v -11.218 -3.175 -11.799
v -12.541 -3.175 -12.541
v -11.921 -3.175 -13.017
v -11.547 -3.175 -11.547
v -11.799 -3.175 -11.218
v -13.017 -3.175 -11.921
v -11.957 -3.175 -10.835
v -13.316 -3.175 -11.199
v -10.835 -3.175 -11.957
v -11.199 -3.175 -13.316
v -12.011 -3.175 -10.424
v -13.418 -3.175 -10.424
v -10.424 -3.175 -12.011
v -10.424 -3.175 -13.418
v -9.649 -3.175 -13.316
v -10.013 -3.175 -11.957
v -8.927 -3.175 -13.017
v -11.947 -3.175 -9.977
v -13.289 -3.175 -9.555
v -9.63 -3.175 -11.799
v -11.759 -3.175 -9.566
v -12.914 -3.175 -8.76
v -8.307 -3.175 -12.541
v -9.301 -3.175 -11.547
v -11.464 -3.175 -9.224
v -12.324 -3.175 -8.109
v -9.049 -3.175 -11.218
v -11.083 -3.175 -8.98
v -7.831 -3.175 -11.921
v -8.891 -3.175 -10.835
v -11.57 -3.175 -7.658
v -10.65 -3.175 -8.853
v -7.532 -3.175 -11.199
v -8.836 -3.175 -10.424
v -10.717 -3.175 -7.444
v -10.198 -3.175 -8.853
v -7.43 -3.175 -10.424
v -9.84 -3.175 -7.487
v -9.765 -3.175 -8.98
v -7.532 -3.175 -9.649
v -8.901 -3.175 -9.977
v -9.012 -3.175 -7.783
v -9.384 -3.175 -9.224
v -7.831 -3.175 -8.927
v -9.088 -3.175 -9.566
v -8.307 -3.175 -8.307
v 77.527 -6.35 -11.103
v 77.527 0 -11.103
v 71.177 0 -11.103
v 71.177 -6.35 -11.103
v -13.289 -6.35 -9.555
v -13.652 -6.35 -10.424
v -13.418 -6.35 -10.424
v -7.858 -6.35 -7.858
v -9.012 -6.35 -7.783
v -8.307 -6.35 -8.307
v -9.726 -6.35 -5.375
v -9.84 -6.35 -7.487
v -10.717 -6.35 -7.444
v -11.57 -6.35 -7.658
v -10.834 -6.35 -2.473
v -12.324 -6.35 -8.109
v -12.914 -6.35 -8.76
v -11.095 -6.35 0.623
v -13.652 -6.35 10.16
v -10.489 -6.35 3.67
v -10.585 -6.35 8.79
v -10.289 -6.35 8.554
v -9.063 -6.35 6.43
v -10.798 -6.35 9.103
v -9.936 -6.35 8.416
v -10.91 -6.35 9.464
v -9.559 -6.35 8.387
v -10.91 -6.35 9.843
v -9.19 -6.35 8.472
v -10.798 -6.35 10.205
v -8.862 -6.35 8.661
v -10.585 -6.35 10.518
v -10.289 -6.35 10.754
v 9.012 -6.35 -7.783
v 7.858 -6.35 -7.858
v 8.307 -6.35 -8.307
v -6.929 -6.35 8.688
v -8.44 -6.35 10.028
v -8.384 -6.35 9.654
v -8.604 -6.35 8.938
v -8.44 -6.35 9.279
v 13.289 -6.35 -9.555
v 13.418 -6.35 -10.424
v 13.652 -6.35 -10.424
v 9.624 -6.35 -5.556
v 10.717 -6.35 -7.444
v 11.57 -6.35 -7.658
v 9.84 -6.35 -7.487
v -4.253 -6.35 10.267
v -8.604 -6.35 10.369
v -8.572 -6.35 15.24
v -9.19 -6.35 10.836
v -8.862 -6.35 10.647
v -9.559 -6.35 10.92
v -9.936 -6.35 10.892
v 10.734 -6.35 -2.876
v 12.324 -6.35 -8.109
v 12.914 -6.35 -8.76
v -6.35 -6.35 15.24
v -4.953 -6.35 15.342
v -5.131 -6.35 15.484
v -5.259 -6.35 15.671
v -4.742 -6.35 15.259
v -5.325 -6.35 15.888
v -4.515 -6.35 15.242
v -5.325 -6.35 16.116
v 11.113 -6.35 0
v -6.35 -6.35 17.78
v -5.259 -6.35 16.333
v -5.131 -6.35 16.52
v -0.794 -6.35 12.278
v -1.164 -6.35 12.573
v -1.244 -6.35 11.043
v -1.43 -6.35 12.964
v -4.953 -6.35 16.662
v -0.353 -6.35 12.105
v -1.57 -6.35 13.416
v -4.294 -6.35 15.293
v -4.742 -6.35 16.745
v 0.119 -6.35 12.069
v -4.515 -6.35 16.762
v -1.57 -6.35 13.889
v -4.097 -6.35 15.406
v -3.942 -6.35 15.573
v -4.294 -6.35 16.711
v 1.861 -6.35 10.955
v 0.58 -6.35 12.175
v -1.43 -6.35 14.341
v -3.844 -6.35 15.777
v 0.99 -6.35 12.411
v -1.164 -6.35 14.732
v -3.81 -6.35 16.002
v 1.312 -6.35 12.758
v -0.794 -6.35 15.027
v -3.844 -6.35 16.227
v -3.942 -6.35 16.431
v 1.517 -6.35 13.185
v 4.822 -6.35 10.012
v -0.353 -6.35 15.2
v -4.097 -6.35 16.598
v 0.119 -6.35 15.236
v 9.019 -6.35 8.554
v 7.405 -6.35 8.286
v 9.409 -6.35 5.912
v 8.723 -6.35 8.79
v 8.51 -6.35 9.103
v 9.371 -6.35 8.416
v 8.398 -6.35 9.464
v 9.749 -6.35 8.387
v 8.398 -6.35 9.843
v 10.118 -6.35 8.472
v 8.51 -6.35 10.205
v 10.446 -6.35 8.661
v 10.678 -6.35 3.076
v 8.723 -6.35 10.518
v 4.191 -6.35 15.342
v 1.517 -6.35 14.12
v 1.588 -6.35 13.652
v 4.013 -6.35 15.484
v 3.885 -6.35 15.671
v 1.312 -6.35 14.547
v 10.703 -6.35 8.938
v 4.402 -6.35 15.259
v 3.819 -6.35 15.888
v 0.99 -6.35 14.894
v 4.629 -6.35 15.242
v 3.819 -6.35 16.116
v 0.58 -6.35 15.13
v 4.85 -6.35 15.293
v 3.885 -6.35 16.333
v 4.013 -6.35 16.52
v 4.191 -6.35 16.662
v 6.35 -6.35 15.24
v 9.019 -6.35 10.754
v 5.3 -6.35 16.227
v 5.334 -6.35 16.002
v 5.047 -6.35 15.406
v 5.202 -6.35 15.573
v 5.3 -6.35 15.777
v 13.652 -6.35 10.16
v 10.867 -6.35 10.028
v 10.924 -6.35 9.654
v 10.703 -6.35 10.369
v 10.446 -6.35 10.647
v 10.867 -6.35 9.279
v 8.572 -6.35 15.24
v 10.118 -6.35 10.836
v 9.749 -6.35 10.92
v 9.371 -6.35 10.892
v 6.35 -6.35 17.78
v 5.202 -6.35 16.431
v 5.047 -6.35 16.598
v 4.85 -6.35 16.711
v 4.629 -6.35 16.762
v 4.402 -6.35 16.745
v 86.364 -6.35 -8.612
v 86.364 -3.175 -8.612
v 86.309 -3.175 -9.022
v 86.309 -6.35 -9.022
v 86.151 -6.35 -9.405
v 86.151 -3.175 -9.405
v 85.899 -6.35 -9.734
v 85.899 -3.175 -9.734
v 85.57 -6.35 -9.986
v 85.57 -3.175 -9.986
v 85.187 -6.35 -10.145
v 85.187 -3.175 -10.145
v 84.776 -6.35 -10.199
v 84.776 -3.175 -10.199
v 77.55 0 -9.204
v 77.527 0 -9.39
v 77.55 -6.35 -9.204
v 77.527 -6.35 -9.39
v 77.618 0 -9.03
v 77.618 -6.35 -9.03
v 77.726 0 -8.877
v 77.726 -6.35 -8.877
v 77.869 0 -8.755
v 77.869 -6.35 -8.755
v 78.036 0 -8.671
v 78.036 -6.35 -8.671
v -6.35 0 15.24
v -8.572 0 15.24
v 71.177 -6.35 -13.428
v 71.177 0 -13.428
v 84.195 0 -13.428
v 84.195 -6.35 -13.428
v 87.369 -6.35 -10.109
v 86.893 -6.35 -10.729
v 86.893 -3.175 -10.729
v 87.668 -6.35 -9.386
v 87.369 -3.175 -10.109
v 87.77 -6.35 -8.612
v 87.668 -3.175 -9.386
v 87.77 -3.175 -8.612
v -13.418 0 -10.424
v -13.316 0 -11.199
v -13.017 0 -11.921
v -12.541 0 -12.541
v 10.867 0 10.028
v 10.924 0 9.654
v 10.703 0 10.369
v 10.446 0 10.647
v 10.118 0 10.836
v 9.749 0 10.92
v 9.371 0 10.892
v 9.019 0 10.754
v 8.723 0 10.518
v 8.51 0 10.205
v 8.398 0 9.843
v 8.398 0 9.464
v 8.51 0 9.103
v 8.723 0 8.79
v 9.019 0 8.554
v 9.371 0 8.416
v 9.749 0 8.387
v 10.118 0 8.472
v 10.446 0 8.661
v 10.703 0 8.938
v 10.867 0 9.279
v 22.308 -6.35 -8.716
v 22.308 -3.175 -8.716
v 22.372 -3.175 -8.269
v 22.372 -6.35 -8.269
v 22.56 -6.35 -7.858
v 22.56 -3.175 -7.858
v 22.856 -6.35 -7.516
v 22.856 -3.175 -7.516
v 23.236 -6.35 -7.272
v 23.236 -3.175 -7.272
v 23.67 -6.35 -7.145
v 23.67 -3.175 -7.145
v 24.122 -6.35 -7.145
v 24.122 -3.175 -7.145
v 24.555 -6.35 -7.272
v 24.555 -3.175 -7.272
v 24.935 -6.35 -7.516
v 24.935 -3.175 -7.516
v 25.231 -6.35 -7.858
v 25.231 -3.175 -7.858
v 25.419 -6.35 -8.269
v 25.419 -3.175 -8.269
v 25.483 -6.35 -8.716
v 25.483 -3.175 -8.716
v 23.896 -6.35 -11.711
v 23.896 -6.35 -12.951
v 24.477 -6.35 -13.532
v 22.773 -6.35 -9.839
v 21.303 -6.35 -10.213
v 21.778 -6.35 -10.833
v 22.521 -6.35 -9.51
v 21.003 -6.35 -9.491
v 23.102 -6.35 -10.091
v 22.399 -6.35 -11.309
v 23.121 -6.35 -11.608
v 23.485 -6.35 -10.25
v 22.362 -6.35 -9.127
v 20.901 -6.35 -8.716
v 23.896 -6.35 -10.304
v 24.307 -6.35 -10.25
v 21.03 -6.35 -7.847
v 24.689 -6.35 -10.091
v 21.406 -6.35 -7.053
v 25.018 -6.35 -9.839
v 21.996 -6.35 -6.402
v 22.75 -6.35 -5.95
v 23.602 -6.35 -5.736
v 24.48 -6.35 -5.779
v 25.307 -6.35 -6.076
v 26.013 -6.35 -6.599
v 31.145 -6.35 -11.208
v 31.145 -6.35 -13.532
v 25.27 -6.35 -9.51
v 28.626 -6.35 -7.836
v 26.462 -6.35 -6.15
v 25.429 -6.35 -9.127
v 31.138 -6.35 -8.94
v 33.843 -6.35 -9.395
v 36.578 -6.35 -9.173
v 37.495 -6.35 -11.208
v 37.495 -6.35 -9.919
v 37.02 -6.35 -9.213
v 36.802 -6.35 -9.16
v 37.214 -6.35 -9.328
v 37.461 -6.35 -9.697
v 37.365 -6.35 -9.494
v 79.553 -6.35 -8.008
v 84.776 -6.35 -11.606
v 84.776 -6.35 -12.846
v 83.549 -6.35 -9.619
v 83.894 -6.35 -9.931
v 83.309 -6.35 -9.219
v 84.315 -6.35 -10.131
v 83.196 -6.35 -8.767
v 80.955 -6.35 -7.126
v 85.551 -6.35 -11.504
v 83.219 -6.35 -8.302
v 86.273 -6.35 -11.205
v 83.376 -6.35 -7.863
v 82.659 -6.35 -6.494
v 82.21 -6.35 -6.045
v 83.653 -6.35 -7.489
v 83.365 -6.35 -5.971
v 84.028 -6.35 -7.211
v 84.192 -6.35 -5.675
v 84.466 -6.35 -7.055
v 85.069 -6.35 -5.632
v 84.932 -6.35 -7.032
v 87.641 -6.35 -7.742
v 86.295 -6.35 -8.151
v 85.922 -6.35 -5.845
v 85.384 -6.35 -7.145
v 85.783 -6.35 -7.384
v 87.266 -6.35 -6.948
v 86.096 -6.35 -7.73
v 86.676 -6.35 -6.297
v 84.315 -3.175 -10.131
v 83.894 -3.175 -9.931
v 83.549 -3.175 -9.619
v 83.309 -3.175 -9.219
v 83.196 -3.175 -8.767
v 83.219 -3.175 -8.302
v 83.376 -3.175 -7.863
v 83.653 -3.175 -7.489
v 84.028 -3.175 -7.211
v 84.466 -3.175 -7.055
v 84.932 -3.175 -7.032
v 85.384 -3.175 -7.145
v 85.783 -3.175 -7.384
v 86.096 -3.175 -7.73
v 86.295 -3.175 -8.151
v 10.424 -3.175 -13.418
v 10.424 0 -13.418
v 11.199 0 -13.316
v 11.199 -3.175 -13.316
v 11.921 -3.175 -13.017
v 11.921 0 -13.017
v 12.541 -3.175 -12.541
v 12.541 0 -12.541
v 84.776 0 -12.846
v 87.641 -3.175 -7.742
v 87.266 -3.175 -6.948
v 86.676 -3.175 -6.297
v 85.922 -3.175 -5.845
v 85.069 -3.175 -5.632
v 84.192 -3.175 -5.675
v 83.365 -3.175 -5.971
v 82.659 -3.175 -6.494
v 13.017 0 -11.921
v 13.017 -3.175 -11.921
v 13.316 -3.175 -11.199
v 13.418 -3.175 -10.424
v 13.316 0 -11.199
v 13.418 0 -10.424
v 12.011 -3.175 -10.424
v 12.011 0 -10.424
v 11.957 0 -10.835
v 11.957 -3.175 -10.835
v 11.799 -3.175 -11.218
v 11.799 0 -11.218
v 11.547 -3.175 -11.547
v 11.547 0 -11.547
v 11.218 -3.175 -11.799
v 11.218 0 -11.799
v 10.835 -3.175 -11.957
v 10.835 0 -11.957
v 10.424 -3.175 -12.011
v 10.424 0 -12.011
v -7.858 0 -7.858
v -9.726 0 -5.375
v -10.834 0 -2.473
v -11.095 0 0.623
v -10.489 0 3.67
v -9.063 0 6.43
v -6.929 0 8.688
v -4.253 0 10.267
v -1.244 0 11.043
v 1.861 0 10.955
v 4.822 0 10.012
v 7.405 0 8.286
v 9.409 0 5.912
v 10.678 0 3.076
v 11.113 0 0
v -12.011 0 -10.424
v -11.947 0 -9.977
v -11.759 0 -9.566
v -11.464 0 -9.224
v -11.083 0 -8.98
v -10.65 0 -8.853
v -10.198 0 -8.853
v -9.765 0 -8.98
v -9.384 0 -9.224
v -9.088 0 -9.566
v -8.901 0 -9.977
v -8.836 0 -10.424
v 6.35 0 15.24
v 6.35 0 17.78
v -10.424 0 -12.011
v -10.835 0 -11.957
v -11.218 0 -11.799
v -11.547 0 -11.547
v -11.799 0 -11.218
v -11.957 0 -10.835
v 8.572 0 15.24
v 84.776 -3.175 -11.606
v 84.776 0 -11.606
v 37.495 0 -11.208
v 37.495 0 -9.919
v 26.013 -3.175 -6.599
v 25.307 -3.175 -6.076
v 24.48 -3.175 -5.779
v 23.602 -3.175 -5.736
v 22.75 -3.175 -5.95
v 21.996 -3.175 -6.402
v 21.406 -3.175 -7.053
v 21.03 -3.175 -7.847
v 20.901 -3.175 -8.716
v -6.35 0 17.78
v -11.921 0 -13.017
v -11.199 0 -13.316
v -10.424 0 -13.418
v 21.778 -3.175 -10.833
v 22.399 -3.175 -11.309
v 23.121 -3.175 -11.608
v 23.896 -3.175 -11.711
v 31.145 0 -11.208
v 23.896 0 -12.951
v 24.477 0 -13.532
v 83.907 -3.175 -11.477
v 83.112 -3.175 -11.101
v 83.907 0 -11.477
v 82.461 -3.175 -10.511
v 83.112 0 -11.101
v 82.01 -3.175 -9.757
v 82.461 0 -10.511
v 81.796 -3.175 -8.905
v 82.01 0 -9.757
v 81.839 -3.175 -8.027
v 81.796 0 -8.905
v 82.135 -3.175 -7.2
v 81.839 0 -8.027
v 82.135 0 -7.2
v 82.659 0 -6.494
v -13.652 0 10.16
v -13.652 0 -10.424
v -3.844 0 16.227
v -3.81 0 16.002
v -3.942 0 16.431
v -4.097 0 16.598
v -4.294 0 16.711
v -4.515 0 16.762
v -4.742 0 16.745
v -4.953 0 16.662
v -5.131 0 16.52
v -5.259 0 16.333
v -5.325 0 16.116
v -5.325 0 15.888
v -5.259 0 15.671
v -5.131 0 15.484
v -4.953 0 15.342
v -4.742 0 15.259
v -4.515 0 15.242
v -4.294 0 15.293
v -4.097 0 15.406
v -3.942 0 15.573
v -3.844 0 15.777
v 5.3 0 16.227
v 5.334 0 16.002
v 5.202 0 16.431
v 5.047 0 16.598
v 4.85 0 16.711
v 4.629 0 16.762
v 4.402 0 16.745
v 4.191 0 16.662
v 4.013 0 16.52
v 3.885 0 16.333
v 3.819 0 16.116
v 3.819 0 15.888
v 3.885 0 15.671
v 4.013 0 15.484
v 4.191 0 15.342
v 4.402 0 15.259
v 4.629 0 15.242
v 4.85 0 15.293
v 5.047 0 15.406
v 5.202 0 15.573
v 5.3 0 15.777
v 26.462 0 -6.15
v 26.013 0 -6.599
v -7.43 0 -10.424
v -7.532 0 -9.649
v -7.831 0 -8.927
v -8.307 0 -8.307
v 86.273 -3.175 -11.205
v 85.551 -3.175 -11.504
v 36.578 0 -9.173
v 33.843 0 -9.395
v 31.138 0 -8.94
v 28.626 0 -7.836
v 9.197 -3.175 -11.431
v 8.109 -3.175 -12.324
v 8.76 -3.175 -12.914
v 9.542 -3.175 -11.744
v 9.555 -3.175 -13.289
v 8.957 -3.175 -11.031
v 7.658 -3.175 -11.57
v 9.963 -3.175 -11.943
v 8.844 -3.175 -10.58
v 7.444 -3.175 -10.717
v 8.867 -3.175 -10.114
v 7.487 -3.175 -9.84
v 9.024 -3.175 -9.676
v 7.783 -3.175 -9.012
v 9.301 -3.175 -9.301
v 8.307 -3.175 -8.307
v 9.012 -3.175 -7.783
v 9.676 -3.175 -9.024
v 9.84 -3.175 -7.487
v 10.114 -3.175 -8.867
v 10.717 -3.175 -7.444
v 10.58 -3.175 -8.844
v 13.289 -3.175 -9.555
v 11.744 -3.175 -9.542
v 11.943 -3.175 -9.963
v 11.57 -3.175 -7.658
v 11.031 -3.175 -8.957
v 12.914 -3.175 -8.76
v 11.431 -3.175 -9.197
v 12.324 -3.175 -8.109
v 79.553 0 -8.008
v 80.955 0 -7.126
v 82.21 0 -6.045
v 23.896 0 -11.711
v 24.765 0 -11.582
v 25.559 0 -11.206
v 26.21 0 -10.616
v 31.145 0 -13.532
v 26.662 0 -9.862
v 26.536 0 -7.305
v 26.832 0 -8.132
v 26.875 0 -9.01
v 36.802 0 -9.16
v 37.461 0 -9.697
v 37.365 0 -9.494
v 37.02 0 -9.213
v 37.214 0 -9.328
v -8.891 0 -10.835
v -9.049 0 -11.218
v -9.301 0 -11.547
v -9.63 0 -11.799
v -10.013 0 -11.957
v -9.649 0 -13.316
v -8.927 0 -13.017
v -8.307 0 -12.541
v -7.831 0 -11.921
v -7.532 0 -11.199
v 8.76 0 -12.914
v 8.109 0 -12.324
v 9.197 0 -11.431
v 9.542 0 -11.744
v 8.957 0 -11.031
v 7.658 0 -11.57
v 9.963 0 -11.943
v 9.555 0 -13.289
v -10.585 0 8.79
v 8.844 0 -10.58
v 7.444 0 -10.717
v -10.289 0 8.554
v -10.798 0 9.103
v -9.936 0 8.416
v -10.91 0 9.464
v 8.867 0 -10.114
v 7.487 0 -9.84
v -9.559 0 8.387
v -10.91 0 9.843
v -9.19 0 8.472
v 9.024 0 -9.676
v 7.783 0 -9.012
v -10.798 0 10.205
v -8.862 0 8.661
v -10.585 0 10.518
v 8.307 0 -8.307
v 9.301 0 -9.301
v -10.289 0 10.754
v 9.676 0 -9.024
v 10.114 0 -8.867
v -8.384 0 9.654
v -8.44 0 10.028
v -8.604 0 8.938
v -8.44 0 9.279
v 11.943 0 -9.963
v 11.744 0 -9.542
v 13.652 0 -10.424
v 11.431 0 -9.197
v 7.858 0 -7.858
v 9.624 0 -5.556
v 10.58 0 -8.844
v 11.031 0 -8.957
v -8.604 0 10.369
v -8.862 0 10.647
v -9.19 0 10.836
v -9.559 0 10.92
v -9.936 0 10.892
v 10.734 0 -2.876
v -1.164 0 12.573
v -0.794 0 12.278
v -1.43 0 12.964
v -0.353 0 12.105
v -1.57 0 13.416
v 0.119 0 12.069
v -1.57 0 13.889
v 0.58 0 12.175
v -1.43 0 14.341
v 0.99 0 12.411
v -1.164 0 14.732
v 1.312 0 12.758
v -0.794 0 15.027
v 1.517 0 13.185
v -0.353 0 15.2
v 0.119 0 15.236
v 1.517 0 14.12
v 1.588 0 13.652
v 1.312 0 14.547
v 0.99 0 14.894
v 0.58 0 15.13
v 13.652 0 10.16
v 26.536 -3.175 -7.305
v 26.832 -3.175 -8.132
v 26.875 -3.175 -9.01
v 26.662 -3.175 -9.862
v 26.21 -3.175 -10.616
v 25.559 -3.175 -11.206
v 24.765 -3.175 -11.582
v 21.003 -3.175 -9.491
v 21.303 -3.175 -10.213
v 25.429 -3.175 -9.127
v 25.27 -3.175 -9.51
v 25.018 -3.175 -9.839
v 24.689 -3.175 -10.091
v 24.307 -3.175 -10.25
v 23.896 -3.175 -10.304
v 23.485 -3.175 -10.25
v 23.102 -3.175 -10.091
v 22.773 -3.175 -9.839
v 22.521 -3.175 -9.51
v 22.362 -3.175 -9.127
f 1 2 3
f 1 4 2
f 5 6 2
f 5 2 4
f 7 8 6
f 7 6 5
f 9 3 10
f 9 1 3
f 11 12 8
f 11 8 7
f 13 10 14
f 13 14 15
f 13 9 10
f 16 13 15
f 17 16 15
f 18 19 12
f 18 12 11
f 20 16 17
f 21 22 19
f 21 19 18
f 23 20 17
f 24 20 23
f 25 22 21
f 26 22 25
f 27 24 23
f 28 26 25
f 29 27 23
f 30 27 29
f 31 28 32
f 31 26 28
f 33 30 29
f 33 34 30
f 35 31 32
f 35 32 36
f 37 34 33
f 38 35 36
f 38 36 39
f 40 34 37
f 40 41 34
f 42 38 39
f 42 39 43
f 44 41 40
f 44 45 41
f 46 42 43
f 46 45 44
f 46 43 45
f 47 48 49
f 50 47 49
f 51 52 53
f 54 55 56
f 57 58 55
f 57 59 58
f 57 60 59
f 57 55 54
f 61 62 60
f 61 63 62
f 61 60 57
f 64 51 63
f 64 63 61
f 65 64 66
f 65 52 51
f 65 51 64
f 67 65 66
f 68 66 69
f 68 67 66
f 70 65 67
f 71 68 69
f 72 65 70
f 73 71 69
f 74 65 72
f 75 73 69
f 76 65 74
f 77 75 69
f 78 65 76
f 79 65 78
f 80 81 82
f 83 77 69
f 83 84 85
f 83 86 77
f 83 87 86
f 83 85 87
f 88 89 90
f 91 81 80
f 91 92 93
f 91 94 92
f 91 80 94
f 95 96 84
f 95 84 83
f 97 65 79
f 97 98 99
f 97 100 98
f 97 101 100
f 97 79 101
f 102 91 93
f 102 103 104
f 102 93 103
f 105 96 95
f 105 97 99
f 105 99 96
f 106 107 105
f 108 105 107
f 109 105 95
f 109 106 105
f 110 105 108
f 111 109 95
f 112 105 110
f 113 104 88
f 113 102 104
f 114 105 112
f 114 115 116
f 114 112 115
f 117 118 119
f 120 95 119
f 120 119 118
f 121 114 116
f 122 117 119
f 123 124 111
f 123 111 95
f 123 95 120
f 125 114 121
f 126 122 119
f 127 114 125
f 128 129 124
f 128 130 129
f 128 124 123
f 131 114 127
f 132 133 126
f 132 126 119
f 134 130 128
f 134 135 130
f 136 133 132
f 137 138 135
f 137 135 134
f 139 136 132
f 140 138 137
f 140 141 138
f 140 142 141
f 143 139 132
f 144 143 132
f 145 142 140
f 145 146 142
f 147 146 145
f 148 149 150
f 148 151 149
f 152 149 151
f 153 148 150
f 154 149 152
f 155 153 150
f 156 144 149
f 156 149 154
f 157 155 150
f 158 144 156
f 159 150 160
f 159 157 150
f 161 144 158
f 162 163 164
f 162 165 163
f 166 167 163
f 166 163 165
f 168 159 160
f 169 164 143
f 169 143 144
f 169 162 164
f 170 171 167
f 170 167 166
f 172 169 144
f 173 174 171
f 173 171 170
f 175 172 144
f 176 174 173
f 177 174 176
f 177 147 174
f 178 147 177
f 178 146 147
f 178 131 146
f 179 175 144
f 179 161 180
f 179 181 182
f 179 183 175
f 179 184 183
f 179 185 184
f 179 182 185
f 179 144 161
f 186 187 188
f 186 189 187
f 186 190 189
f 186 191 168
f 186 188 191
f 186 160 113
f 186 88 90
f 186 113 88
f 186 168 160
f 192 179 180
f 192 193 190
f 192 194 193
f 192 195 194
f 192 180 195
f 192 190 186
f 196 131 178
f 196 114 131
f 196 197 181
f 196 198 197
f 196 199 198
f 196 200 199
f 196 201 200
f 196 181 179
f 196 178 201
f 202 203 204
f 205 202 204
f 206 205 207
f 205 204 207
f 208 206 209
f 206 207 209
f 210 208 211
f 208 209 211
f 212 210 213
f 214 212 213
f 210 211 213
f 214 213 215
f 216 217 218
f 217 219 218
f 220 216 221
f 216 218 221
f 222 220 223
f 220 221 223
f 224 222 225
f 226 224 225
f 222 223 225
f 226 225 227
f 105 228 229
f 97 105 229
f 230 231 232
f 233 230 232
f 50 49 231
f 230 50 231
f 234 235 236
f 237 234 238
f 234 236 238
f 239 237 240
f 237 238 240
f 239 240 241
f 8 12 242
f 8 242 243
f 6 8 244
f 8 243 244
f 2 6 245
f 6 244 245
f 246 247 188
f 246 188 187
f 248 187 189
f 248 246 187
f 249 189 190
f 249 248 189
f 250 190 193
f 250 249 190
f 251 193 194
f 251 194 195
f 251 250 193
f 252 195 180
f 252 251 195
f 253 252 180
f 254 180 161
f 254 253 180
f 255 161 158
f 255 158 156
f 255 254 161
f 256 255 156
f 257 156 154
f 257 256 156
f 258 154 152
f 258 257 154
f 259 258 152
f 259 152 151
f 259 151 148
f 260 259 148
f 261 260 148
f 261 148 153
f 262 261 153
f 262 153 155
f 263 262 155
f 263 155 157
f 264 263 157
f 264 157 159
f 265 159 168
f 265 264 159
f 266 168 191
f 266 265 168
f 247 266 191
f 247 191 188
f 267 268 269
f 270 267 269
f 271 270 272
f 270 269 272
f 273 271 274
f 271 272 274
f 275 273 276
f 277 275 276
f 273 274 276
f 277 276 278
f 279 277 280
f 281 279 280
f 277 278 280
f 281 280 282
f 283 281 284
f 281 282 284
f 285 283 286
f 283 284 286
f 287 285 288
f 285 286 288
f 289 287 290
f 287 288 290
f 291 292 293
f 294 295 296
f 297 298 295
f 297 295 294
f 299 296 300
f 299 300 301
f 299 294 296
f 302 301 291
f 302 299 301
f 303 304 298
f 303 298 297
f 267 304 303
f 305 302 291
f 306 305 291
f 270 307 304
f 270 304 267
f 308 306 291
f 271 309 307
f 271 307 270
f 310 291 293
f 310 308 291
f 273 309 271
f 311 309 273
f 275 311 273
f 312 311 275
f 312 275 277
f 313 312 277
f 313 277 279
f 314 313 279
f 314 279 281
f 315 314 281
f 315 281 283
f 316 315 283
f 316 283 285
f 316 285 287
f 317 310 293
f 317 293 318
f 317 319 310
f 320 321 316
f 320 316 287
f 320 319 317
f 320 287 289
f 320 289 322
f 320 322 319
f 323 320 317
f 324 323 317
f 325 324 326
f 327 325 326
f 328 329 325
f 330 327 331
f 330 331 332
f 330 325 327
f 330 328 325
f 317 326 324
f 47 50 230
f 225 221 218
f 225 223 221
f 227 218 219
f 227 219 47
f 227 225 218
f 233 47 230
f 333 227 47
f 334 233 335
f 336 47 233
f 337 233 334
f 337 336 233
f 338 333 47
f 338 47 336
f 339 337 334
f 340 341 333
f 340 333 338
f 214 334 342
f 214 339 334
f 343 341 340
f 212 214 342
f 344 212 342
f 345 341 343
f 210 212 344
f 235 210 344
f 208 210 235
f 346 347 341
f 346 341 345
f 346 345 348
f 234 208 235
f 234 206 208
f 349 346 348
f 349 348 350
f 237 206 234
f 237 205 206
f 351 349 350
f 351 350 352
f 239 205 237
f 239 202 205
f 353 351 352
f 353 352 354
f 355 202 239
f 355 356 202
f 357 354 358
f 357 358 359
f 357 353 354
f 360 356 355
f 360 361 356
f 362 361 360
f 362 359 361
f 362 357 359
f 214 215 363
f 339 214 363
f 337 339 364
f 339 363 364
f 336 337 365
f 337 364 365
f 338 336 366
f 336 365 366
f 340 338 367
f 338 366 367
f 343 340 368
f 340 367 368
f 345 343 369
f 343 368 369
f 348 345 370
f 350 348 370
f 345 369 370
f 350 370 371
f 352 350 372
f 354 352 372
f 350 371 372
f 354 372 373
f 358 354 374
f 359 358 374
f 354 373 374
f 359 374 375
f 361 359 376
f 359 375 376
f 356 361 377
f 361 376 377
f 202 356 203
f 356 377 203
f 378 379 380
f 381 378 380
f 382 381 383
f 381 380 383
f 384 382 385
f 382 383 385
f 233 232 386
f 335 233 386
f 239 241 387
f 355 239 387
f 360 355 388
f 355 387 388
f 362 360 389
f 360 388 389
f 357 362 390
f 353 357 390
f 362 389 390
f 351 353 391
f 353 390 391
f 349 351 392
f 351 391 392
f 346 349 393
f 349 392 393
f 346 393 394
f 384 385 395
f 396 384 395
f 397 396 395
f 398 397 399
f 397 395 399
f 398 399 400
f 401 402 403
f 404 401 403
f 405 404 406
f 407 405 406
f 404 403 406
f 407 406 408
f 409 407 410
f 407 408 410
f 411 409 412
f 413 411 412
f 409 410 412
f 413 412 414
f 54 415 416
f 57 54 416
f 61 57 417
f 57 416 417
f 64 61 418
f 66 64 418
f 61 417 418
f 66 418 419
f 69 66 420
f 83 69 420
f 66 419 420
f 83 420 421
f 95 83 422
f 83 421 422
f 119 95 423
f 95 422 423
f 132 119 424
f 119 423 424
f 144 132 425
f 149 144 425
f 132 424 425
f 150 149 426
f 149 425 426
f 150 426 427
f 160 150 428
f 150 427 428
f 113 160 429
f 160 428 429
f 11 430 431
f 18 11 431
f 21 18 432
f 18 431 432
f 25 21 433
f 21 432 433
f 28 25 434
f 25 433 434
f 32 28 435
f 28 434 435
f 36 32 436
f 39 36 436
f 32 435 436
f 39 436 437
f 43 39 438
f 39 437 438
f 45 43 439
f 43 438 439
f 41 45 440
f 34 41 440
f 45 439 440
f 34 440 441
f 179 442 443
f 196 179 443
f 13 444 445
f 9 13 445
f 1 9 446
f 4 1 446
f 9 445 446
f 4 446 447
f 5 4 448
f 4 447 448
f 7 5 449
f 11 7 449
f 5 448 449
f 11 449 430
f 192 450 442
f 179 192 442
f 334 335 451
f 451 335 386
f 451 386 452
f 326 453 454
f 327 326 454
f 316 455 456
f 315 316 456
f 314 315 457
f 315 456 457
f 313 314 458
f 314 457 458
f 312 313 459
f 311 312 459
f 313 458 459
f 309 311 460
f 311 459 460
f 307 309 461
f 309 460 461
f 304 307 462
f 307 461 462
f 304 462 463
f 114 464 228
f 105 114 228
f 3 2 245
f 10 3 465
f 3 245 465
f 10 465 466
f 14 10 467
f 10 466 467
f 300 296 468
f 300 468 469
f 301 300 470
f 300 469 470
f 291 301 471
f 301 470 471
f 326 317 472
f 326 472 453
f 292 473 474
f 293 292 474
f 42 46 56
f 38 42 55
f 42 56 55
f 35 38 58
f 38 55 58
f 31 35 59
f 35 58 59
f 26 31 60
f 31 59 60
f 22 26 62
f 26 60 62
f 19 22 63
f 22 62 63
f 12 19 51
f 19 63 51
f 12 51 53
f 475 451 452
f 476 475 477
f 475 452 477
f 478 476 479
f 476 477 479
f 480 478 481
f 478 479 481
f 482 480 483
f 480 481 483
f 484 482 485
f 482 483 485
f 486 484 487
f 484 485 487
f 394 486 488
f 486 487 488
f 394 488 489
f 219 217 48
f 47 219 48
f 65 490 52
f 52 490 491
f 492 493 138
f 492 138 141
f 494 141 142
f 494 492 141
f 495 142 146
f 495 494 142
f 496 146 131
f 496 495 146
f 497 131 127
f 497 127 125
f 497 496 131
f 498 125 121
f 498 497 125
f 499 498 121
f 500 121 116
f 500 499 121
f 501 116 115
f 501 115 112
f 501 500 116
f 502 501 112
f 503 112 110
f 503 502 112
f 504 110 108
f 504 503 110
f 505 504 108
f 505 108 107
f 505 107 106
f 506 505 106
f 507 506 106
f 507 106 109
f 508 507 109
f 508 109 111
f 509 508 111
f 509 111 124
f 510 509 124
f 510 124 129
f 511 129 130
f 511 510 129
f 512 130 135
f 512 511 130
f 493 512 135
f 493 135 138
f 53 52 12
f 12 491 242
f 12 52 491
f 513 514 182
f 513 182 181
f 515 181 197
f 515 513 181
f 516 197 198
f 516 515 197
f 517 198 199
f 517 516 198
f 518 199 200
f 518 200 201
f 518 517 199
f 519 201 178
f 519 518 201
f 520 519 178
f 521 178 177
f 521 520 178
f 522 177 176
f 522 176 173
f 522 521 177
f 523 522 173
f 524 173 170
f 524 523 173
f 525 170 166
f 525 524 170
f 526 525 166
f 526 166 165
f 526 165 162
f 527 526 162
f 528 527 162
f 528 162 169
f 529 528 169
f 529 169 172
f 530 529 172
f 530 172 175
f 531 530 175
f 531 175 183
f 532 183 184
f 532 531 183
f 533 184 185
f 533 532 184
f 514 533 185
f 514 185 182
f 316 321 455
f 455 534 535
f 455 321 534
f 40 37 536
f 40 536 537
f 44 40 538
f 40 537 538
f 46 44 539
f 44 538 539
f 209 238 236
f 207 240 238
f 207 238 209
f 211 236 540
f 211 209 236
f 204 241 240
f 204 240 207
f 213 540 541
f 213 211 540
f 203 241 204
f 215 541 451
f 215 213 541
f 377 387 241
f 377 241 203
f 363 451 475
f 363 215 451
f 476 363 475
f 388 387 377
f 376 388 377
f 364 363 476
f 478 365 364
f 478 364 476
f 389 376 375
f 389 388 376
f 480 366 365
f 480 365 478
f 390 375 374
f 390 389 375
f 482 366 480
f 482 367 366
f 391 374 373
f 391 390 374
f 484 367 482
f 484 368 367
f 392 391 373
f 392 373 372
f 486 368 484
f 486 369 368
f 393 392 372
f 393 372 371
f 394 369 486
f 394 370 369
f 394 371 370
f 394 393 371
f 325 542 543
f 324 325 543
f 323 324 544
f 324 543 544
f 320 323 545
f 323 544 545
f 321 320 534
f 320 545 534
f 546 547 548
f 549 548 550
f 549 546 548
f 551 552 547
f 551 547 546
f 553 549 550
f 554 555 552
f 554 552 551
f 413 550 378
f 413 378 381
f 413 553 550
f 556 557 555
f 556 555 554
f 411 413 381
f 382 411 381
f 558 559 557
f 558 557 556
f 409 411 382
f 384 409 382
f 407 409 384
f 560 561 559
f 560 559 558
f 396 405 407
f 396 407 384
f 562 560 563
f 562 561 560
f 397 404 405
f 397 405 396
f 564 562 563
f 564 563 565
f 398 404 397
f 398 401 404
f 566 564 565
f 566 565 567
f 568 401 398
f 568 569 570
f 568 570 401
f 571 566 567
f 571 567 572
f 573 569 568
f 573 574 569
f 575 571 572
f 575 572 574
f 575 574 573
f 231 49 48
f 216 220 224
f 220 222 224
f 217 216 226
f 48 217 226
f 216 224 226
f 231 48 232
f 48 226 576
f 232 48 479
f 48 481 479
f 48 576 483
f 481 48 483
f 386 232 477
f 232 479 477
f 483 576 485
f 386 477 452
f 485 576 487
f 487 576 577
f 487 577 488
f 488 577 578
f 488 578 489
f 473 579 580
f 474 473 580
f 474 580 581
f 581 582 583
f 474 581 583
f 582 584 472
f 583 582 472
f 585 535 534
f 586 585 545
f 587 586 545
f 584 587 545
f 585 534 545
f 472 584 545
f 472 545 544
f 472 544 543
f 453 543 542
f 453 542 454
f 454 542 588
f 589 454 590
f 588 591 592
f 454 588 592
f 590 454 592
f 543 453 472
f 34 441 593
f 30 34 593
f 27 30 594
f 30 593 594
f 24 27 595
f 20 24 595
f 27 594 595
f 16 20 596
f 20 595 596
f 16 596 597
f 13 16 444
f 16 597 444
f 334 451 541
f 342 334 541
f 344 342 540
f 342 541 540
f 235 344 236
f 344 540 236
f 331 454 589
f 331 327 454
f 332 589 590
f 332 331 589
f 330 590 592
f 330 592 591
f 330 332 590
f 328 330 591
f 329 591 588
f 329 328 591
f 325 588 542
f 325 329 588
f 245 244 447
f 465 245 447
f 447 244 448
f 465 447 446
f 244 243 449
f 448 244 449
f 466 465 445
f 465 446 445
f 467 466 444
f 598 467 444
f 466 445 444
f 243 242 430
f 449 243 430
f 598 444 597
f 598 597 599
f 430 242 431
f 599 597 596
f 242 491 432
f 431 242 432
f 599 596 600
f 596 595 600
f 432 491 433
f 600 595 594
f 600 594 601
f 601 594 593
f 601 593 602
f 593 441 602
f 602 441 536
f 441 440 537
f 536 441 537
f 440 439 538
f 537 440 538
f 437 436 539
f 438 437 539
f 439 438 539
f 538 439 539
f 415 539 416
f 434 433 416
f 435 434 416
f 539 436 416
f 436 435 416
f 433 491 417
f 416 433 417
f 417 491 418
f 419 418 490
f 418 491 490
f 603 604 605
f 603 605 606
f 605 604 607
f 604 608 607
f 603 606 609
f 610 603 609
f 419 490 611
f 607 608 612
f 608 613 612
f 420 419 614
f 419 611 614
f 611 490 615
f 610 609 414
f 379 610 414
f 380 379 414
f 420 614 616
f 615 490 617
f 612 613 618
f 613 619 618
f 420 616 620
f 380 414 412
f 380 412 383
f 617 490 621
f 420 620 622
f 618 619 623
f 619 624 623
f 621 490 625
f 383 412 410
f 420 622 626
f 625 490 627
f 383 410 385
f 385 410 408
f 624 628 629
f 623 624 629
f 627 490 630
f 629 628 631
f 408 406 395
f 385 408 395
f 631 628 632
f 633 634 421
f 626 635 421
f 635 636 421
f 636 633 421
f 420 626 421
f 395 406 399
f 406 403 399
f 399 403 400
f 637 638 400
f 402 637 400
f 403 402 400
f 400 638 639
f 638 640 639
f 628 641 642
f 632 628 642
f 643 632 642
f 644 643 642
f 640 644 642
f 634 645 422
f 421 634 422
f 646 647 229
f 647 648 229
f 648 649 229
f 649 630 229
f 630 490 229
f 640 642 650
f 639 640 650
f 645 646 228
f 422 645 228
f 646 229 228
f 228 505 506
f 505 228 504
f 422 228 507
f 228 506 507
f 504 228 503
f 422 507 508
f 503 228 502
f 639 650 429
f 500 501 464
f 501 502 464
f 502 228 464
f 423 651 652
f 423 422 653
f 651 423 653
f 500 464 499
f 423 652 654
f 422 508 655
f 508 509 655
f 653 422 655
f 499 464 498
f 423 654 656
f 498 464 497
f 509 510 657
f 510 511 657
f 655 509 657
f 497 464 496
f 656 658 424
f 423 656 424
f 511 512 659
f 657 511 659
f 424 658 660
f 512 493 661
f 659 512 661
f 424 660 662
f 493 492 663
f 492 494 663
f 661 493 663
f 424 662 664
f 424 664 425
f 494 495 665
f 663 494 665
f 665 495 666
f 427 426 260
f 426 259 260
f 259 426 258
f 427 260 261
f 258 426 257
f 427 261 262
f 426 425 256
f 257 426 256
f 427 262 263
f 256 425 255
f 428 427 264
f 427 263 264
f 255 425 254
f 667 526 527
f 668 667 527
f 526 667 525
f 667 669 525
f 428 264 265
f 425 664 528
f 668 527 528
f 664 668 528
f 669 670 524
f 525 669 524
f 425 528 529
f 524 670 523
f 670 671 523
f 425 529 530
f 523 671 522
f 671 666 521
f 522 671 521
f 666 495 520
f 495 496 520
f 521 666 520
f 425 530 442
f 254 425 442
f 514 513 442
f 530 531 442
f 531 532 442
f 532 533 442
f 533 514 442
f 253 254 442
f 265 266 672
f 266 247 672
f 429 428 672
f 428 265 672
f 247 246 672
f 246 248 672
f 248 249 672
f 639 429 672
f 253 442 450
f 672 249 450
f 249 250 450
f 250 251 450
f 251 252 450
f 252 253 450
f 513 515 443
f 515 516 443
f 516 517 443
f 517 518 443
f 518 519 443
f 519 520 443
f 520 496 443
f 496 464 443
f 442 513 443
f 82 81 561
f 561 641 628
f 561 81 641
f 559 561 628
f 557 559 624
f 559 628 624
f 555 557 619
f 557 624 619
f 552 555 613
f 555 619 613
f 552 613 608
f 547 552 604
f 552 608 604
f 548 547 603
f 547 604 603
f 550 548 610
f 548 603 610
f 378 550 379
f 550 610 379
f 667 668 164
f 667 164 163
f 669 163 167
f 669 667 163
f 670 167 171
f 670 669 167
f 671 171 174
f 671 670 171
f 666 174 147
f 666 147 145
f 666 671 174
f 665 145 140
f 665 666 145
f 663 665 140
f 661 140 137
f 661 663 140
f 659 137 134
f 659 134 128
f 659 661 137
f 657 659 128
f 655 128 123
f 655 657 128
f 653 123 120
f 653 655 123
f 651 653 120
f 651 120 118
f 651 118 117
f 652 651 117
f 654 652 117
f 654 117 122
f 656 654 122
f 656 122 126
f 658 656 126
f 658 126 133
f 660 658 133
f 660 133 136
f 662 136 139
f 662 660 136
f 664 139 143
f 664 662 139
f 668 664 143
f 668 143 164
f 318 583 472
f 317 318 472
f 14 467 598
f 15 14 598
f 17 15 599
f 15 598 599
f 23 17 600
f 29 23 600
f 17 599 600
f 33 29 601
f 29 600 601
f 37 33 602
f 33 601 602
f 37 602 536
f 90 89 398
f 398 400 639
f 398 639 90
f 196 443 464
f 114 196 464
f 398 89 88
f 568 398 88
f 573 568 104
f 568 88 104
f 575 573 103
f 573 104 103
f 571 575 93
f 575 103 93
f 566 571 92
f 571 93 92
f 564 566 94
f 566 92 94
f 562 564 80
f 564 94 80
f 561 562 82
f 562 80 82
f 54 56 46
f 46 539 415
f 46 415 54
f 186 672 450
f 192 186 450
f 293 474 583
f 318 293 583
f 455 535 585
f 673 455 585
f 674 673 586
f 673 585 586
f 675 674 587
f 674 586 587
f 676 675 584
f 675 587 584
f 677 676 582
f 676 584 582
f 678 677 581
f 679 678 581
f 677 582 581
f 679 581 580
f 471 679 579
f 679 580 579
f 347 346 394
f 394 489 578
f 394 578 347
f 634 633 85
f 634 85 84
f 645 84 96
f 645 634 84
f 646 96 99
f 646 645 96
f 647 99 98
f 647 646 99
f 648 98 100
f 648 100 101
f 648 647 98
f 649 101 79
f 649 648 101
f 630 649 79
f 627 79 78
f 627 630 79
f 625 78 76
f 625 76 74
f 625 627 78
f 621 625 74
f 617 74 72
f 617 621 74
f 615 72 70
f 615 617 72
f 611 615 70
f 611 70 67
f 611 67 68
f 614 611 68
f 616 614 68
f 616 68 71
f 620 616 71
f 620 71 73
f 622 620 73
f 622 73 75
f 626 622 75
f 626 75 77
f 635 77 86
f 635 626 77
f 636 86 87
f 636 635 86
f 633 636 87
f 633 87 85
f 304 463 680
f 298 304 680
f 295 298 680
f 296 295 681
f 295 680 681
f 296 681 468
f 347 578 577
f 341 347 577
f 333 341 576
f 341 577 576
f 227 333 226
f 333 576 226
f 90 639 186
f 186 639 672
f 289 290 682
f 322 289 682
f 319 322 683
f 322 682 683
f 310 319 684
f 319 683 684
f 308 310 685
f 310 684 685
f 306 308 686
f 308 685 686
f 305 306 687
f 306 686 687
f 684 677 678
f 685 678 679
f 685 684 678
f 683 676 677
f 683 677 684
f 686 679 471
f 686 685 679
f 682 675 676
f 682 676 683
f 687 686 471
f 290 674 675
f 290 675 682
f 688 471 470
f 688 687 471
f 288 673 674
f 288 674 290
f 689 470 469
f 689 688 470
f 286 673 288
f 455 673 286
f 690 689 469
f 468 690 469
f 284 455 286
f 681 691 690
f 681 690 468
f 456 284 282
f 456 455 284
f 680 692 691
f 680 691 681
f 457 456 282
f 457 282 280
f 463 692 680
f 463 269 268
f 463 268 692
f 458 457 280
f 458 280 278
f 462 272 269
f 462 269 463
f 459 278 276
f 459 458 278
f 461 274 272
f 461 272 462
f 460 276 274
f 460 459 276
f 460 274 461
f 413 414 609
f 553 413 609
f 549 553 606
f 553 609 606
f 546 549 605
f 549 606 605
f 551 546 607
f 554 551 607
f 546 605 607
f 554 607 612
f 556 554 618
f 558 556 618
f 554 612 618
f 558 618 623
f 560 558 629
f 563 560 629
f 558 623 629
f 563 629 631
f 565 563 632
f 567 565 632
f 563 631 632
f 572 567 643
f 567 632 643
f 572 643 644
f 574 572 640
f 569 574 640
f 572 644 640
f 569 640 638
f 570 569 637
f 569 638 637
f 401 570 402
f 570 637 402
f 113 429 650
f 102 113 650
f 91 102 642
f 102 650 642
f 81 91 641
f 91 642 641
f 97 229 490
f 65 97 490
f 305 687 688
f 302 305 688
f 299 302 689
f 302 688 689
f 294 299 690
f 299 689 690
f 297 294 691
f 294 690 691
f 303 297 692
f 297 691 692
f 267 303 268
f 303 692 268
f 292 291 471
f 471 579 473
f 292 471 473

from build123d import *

# Parameters (mm, degrees)
F0_R      = 1.27
F0_R_2    = 0.762
F0_R_3    = 1.5875
F1_DEPTH  = 6.35
F2_R      = 2.9942741012
F3_DEPTH  = 3.175
F5_DEPTH  = 6.35
F7_DEPTH  = 6.35
F8_R      = 2.9942741012
F9_DEPTH  = 3.175
F10_R     = 2.9942741012
F11_DEPTH = 3.175
F12_R     = 0.762
F13_R     = 0.762


with BuildPart() as f1:
    # F0 (on Front) → F1 (new body)
    with BuildSketch(Plane.XZ):
        with BuildLine():
            ThreePointArc((-7.8577241059, -7.8577241059), (-4.2525696422, 10.266611305), (11.1125, 0))
            ThreePointArc((11.1125, 0), (10.266611305, -4.2525696422), (7.8577241059, -7.8577241059))
            Line((7.8577241059, -7.8577241059), (8.3067069566, -8.3067069566))
            ThreePointArc((8.3067069566, -8.3067069566), (11.5698375688, -7.6576299215), (13.4182525795, -10.4239784783))
            Line((13.4182525795, -10.4239784783), (13.6525, -10.4239784783))
            Line((13.6525, -10.4239784783), (13.6525, 10.16))
            Line((13.6525, 10.16), (8.5725, 15.24))
            Line((8.5725, 15.24), (6.35, 15.24))
            Line((6.35, 15.24), (6.35, 17.78))
            Line((6.35, 17.78), (-6.35, 17.78))
            Line((-6.35, 17.78), (-6.35, 15.24))
            Line((-6.35, 15.24), (-8.5725, 15.24))
            Line((-8.5725, 15.24), (-13.6525, 10.16))
            Line((-13.6525, 10.16), (-13.6525, -10.4239784783))
            Line((-13.6525, -10.4239784783), (-13.4182525795, -10.4239784783))
            ThreePointArc((-13.4182525795, -10.4239784783), (-11.5698375688, -7.6576299215), (-8.3067069566, -8.3067069566))
            Line((-8.3067069566, -8.3067069566), (-7.8577241059, -7.8577241059))
        make_face()
        with Locations((-9.6537753301, 9.6537753301)):
            Circle(F0_R, mode=Mode.SUBTRACT)
        with Locations((-4.572, 16.002)):
            Circle(F0_R_2, mode=Mode.SUBTRACT)
        with Locations((0, 13.6525)):
            Circle(F0_R_3, mode=Mode.SUBTRACT)
        with Locations((4.572, 16.002)):
            Circle(F0_R_2, mode=Mode.SUBTRACT)
        with Locations((9.6537753301, 9.6537753301)):
            Circle(F0_R, mode=Mode.SUBTRACT)
        with BuildLine():
            Line((-12.0114784783, -10.4239784783), (-13.4182525795, -10.4239784783))
            ThreePointArc((-13.4182525795, -10.4239784783), (-13.1903270351, -11.5698375688), (-12.54125, -12.54125))
            ThreePointArc((-12.54125, -12.54125), (-11.5698375688, -13.1903270351), (-10.4239784783, -13.4182525795))
            Line((-10.4239784783, -13.4182525795), (-10.4239784783, -12.0114784783))
            ThreePointArc((-10.4239784783, -12.0114784783), (-11.5465104934, -11.5465104934), (-12.0114784783, -10.4239784783))
        make_face()
        with BuildLine():
            ThreePointArc((-7.4297043771, -10.4239784783), (-7.6576299215, -9.2781193878), (-8.3067069566, -8.3067069566))
            ThreePointArc((-8.3067069566, -8.3067069566), (-11.5698375688, -7.6576299215), (-13.4182525795, -10.4239784783))
            Line((-13.4182525795, -10.4239784783), (-12.0114784783, -10.4239784783))
            ThreePointArc((-12.0114784783, -10.4239784783), (-10.4239784783, -8.8364784783), (-8.8364784783, -10.4239784783))
            ThreePointArc((-8.8364784783, -10.4239784783), (-9.3014464632, -11.5465104934), (-10.4239784783, -12.0114784783))
            Line((-10.4239784783, -12.0114784783), (-10.4239784783, -13.4182525795))
            ThreePointArc((-10.4239784783, -13.4182525795), (-8.3067069566, -12.54125), (-7.4297043771, -10.4239784783))
        make_face()
        with BuildLine():
            ThreePointArc((13.4182525795, -10.4239784783), (11.5698375688, -7.6576299215), (8.3067069566, -8.3067069566))
            ThreePointArc((8.3067069566, -8.3067069566), (7.6576299215, -11.5698375688), (10.4239784783, -13.4182525795))
            Line((10.4239784783, -13.4182525795), (10.4239784783, -12.0114784783))
            ThreePointArc((10.4239784783, -12.0114784783), (9.3014464632, -9.3014464632), (12.0114784783, -10.4239784783))
            Line((12.0114784783, -10.4239784783), (13.4182525795, -10.4239784783))
        make_face()
        with BuildLine():
            ThreePointArc((12.5412499532, -12.5412500468), (13.1903270225, -11.5698375994), (13.4182525795, -10.4239784783))
            Line((13.4182525795, -10.4239784783), (12.0114784783, -10.4239784783))
            ThreePointArc((12.0114784783, -10.4239784783), (11.5465104934, -11.5465104934), (10.4239784783, -12.0114784783))
            Line((10.4239784783, -12.0114784783), (10.4239784783, -13.4182525795))
            ThreePointArc((10.4239784783, -13.4182525795), (11.5698375382, -13.1903270478), (12.5412499532, -12.5412500468))
        make_face()
    extrude(amount=F1_DEPTH)

    # F2 (on face) → F3 (cut)
    with BuildSketch(Plane.XZ.offset(6.35)):
        with Locations((-10.4239784783, -10.4239784783)):
            Circle(F2_R)
        with Locations((10.4239784783, -10.4239784783)):
            Circle(F2_R)
    extrude(amount=-F3_DEPTH, mode=Mode.SUBTRACT)


with BuildPart() as f5:
    # F4 (on Front) → F5 (new body)
    with BuildSketch(Plane.XZ):
        with BuildLine():
            ThreePointArc((26.8899129888, -8.7162277541), (26.6619874445, -7.5703686636), (26.0129104093, -6.5989562324))
            ThreePointArc((26.0129104093, -6.5989562324), (22.7497797971, -5.9498791973), (20.9013647864, -8.7162277541))
            Line((20.9013647864, -8.7162277541), (22.3081388876, -8.7162277541))
            ThreePointArc((22.3081388876, -8.7162277541), (23.8956388876, -7.1287277541), (25.4831388876, -8.7162277541))
            ThreePointArc((25.4831388876, -8.7162277541), (25.0181709028, -9.8387597693), (23.8956388876, -10.3037277541))
            Line((23.8956388876, -10.3037277541), (23.8956388876, -11.7105018553))
            ThreePointArc((23.8956388876, -11.7105018553), (26.0129104093, -10.8334992758), (26.8899129888, -8.7162277541))
        make_face()
        with BuildLine():
            Line((22.3081388876, -8.7162277541), (20.9013647864, -8.7162277541))
            ThreePointArc((20.9013647864, -8.7162277541), (21.1292903308, -9.8620868446), (21.7783673659, -10.8334992758))
            ThreePointArc((21.7783673659, -10.8334992758), (22.7497797971, -11.482576311), (23.8956388876, -11.7105018553))
            Line((23.8956388876, -11.7105018553), (23.8956388876, -10.3037277541))
            ThreePointArc((23.8956388876, -10.3037277541), (22.7731068725, -9.8387597693), (22.3081388876, -8.7162277541))
        make_face()
        with BuildLine():
            ThreePointArc((37.4946173659, -8.9415230187), (31.5937847212, -9.0652475884), (26.46189326, -6.1499733817))
            Line((26.46189326, -6.1499733817), (26.0129104093, -6.5989562324))
            ThreePointArc((26.0129104093, -6.5989562324), (26.6619874445, -7.5703686636), (26.8899129888, -8.7162277541))
            ThreePointArc((26.8899129888, -8.7162277541), (26.0129104093, -10.8334992758), (23.8956388876, -11.7105018553))
            Line((23.8956388876, -11.7105018553), (23.8956388876, -12.9507707975))
            Line((23.8956388876, -12.9507707975), (24.4771173659, -13.5322492758))
            Line((24.4771173659, -13.5322492758), (31.1446173659, -13.5322492758))
            Line((31.1446173659, -13.5322492758), (31.1446173659, -11.2078400538))
            Line((31.1446173659, -11.2078400538), (37.4946173659, -11.2078400538))
            Line((37.4946173659, -11.2078400538), (37.4946173659, -8.9415230187))
        make_face()
    extrude(amount=F5_DEPTH)

    # F8 (on face) → F9 (cut)
    with BuildSketch(Plane(origin=(0, 0, 0), x_dir=(-1, 0, 0), z_dir=(0, 1, 0))):
        with Locations((-23.8956388876, -8.7162277541)):
            Circle(F8_R)
    extrude(amount=-F9_DEPTH, mode=Mode.SUBTRACT)

    # F12
    f12_edges = [f5.edges().sort_by_distance(p)[0] for p in [
        (37.494617, -3.175, -8.941523),
    ]]
    fillet(f12_edges, radius=F12_R)


with BuildPart() as f7:
    # F6 (on Front) → F7 (new body)
    with BuildSketch(Plane.XZ):
        with BuildLine():
            Line((82.6587371794, -6.4942501965), (82.2097543287, -6.0452673458))
            ThreePointArc((82.2097543287, -6.0452673458), (80.0422356359, -7.7326581479), (77.5270302228, -8.8368169827))
            Line((77.5270302228, -8.8368169827), (77.5270302228, -11.1031340179))
            Line((77.5270302228, -11.1031340179), (71.1770302228, -11.1031340179))
            Line((71.1770302228, -11.1031340179), (71.1770302228, -13.4275432399))
            Line((71.1770302228, -13.4275432399), (84.1945302228, -13.4275432399))
            Line((84.1945302228, -13.4275432399), (84.7760087011, -12.8460647616))
            Line((84.7760087011, -12.8460647616), (84.7760087011, -11.6057958194))
            ThreePointArc((84.7760087011, -11.6057958194), (82.0096601442, -9.7573808087), (82.6587371794, -6.4942501965))
        make_face()
        with BuildLine():
            ThreePointArc((87.7702828023, -8.6115217182), (85.9218677916, -5.8451731614), (82.6587371794, -6.4942501965))
            ThreePointArc((82.6587371794, -6.4942501965), (82.0096601442, -9.7573808087), (84.7760087011, -11.6057958194))
            Line((84.7760087011, -11.6057958194), (84.7760087011, -10.1990217182))
            ThreePointArc((84.7760087011, -10.1990217182), (83.6534766859, -7.4889897031), (86.3635087011, -8.6115217182))
            Line((86.3635087011, -8.6115217182), (87.7702828023, -8.6115217182))
        make_face()
        with BuildLine():
            ThreePointArc((86.8932802188, -10.7287932438), (87.5423572568, -9.7573808113), (87.7702828023, -8.6115217182))
            Line((87.7702828023, -8.6115217182), (86.3635087011, -8.6115217182))
            ThreePointArc((86.3635087011, -8.6115217182), (85.8985407162, -9.7340537333), (84.7760087011, -10.1990217182))
            Line((84.7760087011, -10.1990217182), (84.7760087011, -11.6057958194))
            ThreePointArc((84.7760087011, -11.6057958194), (85.921867789, -11.3778702761), (86.8932802188, -10.7287932438))
        make_face()
    extrude(amount=F7_DEPTH)

    # F10 (on face) → F11 (cut)
    with BuildSketch(Plane(origin=(0, 0, 0), x_dir=(-1, 0, 0), z_dir=(0, 1, 0))):
        with Locations((-84.7760087011, -8.6115217182)):
            Circle(F10_R)
    extrude(amount=-F11_DEPTH, mode=Mode.SUBTRACT)

    # F13
    f13_edges = [f7.edges().sort_by_distance(p)[0] for p in [
        (77.52703, -3.175, -8.836817),
    ]]
    fillet(f13_edges, radius=F13_R)


solid = Compound([f1.part, f5.part, f7.part])
